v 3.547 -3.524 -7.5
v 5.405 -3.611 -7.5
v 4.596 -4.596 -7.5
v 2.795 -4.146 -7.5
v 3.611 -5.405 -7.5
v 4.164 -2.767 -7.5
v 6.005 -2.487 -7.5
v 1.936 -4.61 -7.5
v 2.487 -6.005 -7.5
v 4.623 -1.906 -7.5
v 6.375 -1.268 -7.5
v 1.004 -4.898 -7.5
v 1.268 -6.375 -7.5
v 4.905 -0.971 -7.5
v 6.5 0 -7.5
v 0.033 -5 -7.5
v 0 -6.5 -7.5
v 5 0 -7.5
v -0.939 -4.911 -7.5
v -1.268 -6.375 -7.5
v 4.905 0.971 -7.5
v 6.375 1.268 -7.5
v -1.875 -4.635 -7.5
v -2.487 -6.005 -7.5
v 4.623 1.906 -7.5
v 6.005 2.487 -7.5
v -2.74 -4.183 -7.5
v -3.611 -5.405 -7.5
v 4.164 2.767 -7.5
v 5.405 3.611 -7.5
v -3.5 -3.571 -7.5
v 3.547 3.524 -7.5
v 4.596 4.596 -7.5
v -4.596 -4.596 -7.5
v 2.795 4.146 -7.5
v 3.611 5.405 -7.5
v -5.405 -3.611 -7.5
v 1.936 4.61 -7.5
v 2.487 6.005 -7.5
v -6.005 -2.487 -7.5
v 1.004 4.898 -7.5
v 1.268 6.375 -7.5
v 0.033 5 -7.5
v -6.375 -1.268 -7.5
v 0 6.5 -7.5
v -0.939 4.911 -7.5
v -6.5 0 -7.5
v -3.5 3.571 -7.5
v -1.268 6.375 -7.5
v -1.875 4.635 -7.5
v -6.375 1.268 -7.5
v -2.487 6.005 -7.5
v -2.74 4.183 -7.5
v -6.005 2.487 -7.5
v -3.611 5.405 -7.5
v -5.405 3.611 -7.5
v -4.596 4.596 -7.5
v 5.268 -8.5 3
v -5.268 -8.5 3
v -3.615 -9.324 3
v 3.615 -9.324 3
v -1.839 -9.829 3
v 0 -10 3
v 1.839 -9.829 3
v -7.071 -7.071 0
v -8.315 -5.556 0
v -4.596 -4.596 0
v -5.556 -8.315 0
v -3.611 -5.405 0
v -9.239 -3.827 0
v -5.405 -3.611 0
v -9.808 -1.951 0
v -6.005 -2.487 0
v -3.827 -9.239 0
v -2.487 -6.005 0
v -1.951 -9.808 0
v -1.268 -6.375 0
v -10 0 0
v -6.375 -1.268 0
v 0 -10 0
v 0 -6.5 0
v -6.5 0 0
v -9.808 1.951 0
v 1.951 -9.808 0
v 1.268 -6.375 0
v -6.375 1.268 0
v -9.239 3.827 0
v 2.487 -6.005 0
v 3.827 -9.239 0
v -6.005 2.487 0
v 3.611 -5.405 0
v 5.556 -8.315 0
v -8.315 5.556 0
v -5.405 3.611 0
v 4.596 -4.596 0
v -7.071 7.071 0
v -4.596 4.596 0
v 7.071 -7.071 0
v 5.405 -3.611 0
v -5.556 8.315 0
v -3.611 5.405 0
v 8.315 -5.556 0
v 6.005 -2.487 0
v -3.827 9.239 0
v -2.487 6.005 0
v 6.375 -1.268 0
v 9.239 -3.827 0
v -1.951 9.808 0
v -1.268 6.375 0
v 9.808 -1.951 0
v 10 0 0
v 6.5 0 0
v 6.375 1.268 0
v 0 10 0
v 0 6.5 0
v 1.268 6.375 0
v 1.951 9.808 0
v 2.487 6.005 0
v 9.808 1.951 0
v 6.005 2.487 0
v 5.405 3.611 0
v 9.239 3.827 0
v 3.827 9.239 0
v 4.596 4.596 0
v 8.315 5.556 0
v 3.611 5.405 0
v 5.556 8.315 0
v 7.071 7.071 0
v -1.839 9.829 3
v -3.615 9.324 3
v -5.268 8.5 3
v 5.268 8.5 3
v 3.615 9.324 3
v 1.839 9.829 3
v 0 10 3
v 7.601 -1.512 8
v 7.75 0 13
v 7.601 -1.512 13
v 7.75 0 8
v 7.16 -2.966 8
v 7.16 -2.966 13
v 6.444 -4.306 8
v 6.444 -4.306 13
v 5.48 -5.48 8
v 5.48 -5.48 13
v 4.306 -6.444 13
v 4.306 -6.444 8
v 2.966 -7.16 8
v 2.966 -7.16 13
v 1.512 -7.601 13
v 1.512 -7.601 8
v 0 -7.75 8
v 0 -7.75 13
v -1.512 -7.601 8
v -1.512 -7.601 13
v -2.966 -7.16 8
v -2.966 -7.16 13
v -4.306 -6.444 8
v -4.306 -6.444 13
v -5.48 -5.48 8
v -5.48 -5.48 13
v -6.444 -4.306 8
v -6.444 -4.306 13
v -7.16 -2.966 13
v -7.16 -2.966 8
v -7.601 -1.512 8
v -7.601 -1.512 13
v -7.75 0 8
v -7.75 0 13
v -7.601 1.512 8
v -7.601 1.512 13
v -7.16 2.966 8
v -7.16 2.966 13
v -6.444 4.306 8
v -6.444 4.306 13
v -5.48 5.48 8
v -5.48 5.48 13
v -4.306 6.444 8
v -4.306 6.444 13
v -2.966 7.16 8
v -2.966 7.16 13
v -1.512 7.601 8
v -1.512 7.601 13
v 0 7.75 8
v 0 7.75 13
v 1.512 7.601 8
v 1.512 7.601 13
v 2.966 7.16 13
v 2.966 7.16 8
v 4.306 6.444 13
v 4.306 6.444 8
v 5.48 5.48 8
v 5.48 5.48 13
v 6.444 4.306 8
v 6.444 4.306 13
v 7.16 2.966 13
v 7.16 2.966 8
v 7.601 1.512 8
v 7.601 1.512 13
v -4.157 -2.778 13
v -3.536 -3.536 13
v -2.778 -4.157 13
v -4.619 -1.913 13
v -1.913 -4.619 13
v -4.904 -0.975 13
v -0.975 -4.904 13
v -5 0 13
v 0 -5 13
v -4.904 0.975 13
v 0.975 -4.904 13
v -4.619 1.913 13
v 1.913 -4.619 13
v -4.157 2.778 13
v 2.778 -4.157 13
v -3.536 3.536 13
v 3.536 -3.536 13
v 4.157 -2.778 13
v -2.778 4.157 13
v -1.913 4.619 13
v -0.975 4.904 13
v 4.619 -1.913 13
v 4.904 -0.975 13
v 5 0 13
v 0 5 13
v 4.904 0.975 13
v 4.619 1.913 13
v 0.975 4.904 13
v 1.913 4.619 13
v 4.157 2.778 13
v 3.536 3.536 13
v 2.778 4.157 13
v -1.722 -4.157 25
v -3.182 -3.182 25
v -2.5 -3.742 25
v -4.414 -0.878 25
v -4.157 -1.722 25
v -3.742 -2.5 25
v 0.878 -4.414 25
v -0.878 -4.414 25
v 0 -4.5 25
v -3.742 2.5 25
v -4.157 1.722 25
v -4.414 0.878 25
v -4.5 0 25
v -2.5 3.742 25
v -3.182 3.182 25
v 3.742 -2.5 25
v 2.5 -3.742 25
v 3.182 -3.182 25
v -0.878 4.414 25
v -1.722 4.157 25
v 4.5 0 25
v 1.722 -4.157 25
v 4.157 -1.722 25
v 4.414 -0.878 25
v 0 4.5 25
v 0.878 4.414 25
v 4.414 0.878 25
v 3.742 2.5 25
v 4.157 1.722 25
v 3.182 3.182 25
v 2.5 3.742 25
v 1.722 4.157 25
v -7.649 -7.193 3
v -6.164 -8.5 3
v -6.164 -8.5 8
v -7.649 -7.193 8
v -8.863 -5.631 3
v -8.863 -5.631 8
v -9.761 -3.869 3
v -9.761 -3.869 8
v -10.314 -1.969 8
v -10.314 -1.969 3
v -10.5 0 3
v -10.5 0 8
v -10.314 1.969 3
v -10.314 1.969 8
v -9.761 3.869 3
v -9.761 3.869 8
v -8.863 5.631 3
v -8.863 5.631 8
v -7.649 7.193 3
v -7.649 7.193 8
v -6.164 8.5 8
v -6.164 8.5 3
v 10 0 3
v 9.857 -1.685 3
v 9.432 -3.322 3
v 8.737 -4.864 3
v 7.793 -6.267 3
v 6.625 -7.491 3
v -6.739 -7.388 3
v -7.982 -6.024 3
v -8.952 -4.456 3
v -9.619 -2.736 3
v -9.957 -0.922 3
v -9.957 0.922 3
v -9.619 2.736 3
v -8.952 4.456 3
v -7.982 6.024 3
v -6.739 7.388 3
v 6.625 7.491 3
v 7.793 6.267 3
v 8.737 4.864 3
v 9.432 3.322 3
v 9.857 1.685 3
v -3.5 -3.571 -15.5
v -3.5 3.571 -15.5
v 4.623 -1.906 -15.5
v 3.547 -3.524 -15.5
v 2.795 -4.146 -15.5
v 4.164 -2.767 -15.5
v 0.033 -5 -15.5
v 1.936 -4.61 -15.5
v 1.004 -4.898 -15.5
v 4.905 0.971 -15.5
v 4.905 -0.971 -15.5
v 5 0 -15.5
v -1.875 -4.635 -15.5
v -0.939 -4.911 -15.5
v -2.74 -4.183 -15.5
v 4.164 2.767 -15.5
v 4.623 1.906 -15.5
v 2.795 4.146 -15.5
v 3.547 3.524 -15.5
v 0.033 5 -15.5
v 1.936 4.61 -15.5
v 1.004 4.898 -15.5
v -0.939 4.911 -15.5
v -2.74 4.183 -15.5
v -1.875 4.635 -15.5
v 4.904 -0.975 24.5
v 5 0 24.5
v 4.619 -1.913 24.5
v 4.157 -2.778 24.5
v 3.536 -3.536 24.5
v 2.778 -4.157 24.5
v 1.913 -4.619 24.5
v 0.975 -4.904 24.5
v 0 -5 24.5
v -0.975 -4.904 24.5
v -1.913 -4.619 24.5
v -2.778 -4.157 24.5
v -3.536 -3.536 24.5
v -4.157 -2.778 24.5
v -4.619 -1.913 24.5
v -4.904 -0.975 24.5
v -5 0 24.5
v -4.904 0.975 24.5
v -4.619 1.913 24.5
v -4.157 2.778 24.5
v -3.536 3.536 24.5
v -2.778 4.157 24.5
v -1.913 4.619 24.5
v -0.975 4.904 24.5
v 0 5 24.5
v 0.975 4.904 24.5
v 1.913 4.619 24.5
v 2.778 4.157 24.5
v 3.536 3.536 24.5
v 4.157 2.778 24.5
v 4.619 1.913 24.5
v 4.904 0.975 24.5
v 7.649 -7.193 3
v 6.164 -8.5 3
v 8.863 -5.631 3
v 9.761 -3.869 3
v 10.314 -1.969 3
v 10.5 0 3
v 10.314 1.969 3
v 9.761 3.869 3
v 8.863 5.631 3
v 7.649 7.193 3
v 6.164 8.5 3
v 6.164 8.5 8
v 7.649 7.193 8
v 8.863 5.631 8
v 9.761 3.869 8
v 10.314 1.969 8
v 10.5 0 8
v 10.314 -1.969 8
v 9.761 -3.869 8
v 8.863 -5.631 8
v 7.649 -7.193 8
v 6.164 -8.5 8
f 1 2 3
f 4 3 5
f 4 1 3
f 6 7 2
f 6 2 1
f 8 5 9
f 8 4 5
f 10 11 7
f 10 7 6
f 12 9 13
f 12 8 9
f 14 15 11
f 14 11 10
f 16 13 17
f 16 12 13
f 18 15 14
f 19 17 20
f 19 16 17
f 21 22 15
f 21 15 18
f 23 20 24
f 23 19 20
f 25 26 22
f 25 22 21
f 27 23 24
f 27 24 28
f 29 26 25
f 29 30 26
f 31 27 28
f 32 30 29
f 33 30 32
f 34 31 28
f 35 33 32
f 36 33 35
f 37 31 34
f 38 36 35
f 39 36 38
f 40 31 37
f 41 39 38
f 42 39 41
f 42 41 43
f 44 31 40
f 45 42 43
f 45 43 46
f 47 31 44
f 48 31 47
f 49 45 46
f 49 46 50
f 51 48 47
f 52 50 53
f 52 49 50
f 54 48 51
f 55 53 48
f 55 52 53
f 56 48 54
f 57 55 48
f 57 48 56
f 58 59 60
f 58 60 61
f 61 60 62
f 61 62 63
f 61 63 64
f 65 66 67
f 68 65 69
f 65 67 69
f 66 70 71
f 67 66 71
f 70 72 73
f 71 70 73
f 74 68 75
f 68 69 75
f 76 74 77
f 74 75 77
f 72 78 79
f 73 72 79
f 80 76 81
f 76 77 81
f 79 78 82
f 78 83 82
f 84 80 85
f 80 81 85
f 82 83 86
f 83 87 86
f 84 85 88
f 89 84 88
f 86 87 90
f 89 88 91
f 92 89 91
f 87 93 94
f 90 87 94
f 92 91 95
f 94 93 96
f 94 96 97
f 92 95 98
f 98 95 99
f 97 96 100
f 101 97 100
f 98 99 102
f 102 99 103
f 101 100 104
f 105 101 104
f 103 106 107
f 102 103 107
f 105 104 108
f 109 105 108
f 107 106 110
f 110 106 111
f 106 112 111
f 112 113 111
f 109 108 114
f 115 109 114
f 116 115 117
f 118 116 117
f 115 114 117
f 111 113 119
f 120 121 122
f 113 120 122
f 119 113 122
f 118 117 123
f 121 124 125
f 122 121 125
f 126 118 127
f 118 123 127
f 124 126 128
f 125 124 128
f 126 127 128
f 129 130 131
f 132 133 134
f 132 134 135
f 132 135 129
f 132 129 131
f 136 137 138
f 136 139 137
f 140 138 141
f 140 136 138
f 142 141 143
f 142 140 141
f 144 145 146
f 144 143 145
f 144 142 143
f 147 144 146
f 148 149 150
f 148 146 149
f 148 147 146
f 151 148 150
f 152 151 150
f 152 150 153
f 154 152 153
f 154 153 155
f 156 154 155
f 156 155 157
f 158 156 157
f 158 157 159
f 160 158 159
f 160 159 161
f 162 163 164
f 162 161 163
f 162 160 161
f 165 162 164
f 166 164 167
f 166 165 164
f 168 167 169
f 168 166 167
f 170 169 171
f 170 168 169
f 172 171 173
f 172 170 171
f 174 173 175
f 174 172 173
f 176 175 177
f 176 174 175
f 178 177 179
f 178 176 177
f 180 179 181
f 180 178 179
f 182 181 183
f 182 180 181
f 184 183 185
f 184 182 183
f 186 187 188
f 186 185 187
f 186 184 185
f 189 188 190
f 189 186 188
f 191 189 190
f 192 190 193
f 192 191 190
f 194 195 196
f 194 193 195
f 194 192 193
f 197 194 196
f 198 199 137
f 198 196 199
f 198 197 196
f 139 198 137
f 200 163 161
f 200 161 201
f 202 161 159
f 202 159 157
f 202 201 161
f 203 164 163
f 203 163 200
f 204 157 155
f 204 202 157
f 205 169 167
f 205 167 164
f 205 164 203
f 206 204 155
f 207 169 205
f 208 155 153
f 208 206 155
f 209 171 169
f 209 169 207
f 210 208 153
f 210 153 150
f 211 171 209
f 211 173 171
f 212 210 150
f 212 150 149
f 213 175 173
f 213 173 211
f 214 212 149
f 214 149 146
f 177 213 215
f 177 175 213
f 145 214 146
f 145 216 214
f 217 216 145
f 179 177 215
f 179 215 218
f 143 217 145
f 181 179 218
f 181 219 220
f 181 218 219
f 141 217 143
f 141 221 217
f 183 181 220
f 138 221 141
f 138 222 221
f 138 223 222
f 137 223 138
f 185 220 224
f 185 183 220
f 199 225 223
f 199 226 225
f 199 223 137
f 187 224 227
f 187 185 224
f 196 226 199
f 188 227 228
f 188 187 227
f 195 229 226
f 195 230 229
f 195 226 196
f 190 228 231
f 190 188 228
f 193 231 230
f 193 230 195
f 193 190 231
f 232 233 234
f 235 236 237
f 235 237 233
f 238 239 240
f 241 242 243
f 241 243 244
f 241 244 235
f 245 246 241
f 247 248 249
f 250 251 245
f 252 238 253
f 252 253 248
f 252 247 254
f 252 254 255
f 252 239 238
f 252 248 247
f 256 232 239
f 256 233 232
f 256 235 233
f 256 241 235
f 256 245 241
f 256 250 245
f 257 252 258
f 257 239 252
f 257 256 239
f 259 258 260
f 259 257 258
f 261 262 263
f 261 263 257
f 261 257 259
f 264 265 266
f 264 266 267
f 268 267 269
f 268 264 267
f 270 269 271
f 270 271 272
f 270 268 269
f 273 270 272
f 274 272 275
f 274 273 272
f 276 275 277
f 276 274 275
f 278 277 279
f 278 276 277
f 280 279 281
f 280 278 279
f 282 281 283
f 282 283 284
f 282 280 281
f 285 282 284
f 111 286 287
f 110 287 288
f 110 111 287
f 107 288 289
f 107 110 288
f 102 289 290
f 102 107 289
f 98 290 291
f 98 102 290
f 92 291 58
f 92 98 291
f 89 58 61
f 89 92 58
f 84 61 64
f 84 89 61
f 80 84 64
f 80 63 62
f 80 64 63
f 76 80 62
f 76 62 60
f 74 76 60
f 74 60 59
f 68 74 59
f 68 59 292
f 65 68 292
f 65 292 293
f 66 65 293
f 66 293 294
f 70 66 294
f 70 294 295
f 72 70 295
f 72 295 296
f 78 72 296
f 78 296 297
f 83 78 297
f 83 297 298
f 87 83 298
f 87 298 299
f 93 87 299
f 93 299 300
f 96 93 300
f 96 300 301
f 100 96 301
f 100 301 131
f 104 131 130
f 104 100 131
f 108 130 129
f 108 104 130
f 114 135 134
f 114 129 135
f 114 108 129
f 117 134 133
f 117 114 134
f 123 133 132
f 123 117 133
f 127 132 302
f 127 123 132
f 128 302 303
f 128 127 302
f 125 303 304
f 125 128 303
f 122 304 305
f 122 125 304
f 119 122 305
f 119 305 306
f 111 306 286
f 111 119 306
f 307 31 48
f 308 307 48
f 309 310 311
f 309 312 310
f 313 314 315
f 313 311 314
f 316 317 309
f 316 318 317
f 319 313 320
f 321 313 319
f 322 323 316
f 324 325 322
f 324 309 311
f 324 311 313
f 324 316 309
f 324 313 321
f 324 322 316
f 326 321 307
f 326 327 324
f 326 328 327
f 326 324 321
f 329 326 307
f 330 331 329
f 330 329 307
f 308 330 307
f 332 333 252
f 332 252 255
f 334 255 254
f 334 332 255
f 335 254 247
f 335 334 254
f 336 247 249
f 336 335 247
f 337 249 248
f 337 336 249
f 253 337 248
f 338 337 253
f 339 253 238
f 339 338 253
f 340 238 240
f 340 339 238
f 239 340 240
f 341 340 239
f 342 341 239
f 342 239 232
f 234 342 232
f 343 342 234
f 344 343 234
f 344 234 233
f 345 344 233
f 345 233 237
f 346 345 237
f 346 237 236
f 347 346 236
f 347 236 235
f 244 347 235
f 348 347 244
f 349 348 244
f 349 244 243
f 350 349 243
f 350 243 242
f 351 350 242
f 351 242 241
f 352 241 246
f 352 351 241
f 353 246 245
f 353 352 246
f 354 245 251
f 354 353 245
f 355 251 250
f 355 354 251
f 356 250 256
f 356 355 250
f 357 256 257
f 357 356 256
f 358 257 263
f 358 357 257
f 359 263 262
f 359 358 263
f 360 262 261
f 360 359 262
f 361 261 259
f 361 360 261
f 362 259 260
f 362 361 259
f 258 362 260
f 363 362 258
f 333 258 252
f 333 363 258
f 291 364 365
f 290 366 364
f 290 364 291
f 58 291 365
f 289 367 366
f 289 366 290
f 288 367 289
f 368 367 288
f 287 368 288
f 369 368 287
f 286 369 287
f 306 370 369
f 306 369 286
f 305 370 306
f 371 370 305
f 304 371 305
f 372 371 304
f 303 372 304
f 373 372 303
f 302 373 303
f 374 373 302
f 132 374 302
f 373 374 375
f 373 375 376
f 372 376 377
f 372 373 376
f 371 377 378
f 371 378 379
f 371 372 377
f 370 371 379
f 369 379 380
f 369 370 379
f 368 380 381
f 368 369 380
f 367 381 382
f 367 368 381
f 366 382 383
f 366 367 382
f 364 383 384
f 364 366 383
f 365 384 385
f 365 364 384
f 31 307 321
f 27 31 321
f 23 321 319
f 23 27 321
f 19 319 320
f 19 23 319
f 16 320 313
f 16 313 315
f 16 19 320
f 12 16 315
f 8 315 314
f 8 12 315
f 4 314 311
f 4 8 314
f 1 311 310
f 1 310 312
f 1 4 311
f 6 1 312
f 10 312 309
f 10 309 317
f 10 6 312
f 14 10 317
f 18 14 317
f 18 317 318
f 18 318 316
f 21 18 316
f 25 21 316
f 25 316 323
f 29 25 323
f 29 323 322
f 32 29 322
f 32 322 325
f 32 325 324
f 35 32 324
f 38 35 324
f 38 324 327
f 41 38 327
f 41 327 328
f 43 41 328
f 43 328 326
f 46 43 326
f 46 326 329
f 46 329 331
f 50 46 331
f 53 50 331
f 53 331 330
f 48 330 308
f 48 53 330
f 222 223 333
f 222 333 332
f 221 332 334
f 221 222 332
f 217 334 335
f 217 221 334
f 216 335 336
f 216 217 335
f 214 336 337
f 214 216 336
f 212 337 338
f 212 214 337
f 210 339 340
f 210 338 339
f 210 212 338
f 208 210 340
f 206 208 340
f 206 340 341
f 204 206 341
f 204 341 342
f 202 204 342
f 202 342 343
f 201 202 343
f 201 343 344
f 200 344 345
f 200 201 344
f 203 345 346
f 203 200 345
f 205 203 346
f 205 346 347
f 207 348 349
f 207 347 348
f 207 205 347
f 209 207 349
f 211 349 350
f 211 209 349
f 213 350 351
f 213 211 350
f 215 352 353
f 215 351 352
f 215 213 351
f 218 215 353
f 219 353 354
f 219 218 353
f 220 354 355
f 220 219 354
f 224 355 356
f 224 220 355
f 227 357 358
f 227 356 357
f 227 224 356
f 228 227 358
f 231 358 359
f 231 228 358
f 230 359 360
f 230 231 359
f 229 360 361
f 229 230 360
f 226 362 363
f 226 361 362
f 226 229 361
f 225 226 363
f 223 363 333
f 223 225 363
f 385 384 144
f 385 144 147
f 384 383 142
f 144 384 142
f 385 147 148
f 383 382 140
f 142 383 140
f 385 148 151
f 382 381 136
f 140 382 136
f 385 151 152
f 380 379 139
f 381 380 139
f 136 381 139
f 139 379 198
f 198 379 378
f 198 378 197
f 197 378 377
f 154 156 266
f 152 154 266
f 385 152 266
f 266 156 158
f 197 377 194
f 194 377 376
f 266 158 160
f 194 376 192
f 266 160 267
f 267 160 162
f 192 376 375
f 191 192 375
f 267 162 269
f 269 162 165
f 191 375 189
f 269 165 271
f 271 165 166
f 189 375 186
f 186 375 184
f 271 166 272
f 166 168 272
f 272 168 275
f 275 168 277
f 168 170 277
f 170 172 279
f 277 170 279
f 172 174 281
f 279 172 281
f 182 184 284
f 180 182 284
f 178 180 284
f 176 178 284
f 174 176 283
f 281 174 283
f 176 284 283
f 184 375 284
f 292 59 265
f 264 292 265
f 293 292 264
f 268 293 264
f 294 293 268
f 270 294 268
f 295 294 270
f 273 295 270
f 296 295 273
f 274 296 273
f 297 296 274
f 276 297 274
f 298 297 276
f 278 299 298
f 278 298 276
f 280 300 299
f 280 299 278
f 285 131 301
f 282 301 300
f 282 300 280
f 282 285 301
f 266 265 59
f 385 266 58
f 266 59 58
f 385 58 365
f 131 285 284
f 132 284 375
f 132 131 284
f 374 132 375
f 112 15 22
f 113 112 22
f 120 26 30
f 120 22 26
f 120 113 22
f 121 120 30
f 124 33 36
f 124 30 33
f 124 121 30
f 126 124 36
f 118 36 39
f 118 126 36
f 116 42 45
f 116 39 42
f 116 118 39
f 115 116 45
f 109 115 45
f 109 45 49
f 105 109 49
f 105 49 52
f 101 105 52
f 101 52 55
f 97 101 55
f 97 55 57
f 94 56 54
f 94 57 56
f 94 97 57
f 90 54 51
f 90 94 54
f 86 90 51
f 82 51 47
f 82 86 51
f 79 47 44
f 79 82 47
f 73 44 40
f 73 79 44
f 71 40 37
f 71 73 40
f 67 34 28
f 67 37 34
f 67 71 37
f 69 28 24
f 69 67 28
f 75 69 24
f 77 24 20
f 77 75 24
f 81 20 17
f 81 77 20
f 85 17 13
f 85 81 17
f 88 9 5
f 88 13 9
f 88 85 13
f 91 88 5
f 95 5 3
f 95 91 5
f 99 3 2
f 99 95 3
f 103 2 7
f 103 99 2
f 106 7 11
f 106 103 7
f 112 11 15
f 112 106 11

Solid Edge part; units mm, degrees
sketch "Sketch1" plane through (0, 0, 0) normal (0, 0, 1) x (1, 0, 0)
  circle A0 centre (0, 0) radius 10
  dimension "D1" = 20
extrude "Protrusion1" add sketch "Sketch1" along normal blind 3
sketch "Sketch2" plane through (0, 0, 0) normal (0, 0, -1) x (1, 0, 0)
  circle A0 centre (0, 0) radius 6.5
  dimension "D1" = 13
extrude "Protrusion2" add sketch "Sketch2" along normal blind 7.5
sketch "Sketch3" plane through (0, 0, -7.5) normal (0, 0, -1) x (1, 0, 0)
  line L0 (-3.5, 3.5707) -> (-3.5, -3.5707)
  arc A0 (-3.5, 3.5707) -> (-3.5, -3.5707) centre (0, 0) cw
  dimension "D1" = 10
  dimension "D2" = 3.5
extrude "Protrusion3" add sketch "Sketch3" along normal blind 8
sketch "Sketch4" plane through (0, 0, 3) normal (0, 0, 1) x (1, 0, 0)
  line L0 (-6.1644, 8.5) -> (6.1644, 8.5)
  arc A0 (6.1644, 8.5) -> (6.1644, -8.5) centre (0, 0) cw
  line L1 (-6.1644, -8.5) -> (6.1644, -8.5)
  arc A1 (-6.1644, -8.5) -> (-6.1644, 8.5) centre (0, 0) cw
  dimension "D1" = 10.5
  dimension "D2" = 8.5
  dimension "D3" = 17
extrude "Protrusion4" add sketch "Sketch4" along normal blind 5
sketch "Sketch5" plane through (0, 0, 8) normal (0, 0, 1) x (1, 0, 0)
  circle A0 centre (0, 0) radius 7.75
  dimension "D1" = 15.5
extrude "Protrusion5" add sketch "Sketch5" along normal blind 5
sketch "Sketch6" plane through (0, 0, 13) normal (0, 0, 1) x (1, 0, 0)
  circle A0 centre (0, 0) radius 5
  dimension "D1" = 10
extrude "Protrusion6" add sketch "Sketch6" along normal blind 12
chamfer "Chamfer1" distance 0.5 angle 45 1 edges at (-5, 0, 25)
properties part number "SHAFT2" material "4140 Steel"
